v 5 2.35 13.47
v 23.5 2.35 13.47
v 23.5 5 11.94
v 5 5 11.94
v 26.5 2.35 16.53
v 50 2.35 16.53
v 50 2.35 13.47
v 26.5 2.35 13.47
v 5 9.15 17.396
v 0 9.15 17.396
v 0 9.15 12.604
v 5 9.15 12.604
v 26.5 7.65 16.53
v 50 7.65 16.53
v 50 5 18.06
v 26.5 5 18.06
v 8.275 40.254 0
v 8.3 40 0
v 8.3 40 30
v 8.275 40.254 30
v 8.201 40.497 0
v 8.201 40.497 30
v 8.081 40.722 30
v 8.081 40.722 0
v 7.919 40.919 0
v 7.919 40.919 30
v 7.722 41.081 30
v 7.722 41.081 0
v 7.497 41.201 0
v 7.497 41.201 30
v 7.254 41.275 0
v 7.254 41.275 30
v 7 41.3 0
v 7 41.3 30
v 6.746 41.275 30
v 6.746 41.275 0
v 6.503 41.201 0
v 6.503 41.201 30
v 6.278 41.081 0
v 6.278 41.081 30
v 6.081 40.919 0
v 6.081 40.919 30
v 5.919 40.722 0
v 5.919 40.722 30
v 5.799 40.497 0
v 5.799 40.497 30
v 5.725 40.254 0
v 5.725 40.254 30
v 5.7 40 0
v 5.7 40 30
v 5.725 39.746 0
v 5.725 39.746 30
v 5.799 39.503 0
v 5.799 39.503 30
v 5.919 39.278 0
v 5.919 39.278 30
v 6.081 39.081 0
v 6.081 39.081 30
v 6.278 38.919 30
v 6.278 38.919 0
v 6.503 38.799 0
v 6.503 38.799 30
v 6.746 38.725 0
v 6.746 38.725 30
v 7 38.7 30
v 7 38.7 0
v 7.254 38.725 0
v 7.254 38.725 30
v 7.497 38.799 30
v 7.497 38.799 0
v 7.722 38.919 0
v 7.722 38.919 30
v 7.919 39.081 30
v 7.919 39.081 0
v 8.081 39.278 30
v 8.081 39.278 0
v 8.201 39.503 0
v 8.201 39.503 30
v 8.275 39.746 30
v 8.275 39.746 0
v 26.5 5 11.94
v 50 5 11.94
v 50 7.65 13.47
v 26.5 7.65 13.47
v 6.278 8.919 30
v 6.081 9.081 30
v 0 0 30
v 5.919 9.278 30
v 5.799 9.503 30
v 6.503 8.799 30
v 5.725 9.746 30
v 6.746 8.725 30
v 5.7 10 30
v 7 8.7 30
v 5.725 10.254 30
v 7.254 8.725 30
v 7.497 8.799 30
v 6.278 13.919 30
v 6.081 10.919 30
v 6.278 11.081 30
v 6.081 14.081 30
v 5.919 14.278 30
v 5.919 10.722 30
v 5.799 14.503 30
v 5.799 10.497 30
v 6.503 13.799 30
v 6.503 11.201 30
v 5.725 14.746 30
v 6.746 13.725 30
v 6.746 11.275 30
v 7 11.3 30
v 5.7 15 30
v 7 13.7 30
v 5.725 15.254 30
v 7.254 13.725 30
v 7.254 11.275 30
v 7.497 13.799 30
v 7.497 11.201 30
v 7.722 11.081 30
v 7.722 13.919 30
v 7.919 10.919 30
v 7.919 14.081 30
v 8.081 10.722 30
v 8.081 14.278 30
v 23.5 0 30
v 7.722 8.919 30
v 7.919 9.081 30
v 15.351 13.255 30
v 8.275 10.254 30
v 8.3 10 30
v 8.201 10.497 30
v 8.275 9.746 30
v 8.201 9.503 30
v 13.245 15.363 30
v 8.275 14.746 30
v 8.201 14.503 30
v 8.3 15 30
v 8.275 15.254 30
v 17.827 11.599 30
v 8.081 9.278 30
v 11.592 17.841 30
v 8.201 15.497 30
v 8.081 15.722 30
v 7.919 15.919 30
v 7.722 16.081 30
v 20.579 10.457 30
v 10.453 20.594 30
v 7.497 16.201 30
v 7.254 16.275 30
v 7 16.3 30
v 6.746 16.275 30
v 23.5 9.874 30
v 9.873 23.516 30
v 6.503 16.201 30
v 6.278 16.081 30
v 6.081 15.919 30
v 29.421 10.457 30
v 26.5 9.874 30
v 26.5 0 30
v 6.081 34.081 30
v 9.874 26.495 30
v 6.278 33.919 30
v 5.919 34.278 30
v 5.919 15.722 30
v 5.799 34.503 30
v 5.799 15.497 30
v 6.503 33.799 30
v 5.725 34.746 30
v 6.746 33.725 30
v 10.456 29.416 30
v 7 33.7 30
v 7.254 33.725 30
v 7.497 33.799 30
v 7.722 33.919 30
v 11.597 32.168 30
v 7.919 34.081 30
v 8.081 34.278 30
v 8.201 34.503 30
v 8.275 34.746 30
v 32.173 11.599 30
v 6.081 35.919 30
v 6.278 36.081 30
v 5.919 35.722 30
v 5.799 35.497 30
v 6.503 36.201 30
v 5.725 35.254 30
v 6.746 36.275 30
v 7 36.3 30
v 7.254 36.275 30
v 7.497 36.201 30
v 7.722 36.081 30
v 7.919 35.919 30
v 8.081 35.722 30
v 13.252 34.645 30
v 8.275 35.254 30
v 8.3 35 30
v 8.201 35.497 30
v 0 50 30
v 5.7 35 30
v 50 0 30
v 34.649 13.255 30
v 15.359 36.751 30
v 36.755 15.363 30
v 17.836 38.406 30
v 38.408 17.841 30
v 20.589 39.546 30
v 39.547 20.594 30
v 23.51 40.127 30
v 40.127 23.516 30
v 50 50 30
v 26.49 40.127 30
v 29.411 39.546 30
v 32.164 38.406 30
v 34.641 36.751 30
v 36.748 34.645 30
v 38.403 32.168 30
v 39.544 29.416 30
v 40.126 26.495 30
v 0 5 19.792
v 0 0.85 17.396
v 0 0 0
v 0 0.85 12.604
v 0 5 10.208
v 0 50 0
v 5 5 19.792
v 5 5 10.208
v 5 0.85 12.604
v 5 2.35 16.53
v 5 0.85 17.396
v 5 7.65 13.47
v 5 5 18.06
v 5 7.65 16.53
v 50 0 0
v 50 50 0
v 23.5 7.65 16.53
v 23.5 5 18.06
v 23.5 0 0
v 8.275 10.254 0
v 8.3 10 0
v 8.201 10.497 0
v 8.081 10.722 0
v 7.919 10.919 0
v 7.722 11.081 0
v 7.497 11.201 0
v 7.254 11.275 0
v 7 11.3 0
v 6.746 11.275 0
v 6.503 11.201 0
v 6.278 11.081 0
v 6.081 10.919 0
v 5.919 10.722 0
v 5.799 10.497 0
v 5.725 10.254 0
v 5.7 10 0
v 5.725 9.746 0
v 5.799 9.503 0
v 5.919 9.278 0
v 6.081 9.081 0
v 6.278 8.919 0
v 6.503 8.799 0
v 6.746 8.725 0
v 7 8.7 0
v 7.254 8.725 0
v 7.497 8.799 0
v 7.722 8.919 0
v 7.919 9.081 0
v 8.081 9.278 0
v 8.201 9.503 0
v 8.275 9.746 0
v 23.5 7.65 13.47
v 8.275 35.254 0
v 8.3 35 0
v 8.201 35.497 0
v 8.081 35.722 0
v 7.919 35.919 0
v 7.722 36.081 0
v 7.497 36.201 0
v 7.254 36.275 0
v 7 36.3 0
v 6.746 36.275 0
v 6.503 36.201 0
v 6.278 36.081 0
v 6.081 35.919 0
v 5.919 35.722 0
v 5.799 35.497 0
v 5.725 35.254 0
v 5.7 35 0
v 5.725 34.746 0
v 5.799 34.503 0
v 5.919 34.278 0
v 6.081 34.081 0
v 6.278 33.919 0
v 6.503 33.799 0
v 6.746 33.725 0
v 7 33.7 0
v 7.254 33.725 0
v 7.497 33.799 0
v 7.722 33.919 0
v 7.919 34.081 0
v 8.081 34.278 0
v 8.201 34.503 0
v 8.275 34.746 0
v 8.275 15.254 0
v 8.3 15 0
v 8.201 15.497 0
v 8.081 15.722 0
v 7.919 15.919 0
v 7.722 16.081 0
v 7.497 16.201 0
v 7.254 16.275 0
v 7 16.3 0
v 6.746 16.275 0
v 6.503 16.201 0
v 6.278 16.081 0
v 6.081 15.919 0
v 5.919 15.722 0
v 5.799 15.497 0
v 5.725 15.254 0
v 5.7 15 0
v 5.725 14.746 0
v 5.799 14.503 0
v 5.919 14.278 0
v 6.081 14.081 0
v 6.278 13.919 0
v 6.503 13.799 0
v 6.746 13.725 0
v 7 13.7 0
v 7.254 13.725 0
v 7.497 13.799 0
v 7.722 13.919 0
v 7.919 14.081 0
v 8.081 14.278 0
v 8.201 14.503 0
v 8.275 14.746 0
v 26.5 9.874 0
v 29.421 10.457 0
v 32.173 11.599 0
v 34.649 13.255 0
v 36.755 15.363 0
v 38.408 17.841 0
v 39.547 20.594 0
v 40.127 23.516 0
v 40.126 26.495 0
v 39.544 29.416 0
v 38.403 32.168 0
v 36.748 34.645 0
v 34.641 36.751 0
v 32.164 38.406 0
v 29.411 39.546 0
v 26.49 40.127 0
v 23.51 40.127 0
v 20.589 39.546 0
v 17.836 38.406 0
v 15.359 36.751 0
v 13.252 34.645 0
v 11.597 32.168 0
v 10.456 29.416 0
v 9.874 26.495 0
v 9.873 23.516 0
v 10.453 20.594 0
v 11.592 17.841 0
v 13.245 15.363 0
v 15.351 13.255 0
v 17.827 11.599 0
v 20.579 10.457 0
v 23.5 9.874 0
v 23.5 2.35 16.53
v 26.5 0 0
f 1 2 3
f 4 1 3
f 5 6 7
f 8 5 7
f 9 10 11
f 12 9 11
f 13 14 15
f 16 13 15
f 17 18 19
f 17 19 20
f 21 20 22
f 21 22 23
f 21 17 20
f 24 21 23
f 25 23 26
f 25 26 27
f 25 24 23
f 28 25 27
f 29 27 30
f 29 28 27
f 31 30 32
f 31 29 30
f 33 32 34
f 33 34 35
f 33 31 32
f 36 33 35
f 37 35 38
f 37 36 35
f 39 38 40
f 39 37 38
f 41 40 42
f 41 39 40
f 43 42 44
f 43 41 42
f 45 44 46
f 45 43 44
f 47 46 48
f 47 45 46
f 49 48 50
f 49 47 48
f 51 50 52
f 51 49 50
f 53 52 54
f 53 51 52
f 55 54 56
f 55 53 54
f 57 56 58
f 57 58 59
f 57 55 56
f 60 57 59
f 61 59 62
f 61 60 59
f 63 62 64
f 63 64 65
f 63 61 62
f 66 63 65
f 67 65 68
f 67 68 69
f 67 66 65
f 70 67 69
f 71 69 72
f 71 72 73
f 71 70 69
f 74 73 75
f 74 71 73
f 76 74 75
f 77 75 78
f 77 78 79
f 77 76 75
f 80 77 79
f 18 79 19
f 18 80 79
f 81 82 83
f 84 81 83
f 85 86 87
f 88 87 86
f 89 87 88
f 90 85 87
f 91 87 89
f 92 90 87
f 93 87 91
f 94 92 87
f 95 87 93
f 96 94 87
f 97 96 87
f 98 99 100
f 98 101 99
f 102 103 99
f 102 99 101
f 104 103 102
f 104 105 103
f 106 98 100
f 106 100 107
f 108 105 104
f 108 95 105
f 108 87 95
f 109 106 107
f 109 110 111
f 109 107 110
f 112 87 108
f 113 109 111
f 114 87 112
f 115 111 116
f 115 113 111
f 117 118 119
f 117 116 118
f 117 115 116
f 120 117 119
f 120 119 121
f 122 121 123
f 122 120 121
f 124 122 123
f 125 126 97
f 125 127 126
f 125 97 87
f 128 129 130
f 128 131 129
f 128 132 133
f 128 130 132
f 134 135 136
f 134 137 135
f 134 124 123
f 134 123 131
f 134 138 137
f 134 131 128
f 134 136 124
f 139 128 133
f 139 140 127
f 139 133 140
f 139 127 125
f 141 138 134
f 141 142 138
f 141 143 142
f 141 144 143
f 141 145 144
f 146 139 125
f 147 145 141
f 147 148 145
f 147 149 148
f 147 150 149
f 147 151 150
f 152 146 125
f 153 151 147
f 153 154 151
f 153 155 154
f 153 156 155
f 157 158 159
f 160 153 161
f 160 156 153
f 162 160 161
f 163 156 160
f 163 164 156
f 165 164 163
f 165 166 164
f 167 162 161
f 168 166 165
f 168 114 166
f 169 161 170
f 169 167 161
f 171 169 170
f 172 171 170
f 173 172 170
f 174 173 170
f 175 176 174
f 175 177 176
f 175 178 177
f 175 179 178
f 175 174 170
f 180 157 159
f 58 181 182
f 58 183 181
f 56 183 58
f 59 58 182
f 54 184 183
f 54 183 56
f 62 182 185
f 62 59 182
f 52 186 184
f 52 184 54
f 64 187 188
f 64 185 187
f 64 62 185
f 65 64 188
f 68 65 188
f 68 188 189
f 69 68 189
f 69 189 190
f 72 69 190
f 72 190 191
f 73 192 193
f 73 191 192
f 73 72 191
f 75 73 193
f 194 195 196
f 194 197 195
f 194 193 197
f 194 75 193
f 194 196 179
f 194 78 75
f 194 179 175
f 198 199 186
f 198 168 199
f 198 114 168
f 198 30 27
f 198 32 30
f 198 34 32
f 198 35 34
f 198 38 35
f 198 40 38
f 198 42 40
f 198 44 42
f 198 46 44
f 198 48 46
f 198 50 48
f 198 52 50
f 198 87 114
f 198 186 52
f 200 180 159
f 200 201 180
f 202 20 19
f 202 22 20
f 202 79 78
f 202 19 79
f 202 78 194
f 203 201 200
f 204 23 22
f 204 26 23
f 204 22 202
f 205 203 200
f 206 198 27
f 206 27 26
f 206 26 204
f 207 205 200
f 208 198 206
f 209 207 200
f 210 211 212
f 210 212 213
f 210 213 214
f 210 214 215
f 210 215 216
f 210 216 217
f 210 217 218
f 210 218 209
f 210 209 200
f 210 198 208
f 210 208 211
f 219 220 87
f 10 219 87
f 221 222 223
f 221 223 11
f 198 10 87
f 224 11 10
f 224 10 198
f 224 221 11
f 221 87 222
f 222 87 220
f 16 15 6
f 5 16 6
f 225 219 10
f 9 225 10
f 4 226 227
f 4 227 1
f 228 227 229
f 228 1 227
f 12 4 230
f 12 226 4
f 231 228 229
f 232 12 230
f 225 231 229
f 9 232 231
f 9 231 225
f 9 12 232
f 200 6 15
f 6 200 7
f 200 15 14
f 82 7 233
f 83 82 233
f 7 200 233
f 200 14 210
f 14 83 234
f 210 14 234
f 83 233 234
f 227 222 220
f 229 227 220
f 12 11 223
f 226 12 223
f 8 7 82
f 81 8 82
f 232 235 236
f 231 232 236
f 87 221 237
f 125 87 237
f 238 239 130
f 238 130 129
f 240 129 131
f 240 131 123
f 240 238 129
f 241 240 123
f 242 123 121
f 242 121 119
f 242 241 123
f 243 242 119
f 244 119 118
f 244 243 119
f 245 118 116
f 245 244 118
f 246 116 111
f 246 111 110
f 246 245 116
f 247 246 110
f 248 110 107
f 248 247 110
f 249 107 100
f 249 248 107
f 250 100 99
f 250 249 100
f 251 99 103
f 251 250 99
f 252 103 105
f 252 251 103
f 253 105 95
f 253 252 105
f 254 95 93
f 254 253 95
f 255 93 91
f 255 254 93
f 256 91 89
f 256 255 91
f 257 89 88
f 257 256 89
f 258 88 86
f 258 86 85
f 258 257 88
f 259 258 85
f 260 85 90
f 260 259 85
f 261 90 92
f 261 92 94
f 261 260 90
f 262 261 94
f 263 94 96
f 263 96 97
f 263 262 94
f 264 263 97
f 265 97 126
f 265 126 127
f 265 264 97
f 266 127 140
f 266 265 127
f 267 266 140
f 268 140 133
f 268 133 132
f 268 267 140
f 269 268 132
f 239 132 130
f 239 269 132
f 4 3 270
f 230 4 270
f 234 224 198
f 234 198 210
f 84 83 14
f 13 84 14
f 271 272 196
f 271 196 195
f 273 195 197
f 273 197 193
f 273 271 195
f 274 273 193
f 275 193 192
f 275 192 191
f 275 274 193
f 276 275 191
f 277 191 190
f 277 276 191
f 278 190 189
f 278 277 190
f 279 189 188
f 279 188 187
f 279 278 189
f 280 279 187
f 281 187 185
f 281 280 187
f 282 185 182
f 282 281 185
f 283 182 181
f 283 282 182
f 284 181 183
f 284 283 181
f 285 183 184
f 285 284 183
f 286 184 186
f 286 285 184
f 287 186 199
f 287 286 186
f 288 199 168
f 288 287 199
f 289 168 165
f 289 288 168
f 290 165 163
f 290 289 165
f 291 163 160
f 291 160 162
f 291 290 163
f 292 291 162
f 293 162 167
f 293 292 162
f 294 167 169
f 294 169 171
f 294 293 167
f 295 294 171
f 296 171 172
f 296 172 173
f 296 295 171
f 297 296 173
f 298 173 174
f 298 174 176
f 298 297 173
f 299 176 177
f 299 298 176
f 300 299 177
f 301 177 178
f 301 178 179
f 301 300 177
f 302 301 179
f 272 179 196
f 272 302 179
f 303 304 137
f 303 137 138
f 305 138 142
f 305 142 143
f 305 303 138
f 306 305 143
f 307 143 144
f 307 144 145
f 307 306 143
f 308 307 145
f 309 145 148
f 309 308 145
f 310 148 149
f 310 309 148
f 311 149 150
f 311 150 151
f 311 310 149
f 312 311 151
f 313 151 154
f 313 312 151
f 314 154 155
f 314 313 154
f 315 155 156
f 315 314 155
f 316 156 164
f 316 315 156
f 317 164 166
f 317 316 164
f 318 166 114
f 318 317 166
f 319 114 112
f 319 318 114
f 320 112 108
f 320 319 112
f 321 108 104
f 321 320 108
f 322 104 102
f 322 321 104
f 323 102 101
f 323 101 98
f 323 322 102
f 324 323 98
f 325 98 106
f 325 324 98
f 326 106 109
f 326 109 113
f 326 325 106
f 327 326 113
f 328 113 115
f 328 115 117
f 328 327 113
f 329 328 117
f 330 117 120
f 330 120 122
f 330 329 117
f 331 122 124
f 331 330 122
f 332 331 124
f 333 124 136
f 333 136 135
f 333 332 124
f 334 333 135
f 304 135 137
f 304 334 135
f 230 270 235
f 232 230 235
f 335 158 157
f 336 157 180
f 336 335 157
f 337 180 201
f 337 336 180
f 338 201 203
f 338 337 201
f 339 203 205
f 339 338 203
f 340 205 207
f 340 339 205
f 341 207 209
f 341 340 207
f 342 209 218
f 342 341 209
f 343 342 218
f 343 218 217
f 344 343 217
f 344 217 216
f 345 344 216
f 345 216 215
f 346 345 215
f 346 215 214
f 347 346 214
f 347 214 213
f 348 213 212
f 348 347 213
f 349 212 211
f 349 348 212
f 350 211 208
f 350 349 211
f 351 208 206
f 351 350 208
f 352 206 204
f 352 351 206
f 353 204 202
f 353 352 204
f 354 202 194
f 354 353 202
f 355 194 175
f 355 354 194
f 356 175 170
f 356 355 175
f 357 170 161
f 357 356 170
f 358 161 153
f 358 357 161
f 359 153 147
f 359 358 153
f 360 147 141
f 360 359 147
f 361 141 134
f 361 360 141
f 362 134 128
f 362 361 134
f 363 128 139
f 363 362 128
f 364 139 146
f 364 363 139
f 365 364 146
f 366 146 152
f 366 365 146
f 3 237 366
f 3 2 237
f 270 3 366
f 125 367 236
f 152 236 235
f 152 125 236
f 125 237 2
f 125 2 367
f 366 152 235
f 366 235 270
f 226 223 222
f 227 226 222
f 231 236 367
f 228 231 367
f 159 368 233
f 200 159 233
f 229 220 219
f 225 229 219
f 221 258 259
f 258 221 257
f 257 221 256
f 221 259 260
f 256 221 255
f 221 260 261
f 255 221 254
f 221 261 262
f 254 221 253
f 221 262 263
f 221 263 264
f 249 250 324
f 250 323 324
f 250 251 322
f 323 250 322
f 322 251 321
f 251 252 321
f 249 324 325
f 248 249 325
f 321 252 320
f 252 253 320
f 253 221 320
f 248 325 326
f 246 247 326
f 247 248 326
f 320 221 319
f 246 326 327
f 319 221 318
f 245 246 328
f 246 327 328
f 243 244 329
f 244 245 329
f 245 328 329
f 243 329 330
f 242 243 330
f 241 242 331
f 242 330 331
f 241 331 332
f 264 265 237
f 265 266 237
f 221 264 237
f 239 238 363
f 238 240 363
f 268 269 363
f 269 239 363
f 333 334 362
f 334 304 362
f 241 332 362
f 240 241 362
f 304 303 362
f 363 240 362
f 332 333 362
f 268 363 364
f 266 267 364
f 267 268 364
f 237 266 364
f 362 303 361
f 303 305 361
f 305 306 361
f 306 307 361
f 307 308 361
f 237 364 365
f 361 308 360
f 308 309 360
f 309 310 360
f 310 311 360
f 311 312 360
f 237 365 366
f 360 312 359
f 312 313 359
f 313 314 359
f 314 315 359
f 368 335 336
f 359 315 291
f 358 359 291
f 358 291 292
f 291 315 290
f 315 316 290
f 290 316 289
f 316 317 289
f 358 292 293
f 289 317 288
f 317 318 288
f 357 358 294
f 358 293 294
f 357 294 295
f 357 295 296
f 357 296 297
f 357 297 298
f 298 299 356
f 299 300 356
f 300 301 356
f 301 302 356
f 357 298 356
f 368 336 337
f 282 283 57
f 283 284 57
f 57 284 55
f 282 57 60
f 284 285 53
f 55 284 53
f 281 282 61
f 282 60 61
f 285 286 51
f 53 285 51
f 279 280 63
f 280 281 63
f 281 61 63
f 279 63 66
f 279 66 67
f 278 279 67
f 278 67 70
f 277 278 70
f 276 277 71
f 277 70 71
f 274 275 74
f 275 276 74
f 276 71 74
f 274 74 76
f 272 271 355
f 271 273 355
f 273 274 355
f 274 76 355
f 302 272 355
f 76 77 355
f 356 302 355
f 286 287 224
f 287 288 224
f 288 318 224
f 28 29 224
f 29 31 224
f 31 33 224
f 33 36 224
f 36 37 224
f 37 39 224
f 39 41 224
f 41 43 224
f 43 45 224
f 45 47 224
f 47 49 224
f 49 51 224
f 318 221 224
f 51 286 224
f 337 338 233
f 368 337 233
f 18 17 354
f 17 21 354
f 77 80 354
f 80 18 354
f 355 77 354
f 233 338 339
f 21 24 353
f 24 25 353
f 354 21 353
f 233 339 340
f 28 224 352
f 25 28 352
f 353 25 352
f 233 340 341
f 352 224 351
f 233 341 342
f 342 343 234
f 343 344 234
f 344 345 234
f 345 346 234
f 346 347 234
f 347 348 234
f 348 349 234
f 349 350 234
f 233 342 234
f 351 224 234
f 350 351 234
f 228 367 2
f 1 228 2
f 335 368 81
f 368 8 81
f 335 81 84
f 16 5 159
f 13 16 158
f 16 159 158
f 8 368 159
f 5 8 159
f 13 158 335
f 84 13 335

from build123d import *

# Parameters (mm, degrees)
SKETCH1_W           = 50
SKETCH1_H           = 50
SKETCH1_R           = 15.2
SKETCH1_R_2         = 1.3
BOSS_EXTRUDE1_DEPTH = 30
CUT_EXTRUDE1_REACH  = 32
SKETCH2_W           = 3
SKETCH2_H           = 11.709133009
CUT_EXTRUDE2_DEPTH  = 54
CUT_EXTRUDE3_DEPTH  = 5


with BuildPart() as part:
    # Sketch1 → Boss-Extrude1 (new body)
    with BuildSketch(Plane.XY):
        with Locations((25, 25)):
            Rectangle(SKETCH1_W, SKETCH1_H)
        with Locations((25, 25)):
            Circle(SKETCH1_R, mode=Mode.SUBTRACT)
        with Locations((7, 15)):
            Circle(SKETCH1_R_2, mode=Mode.SUBTRACT)
        with Locations((7, 40)):
            Circle(SKETCH1_R_2, mode=Mode.SUBTRACT)
        with Locations((7, 10)):
            Circle(SKETCH1_R_2, mode=Mode.SUBTRACT)
        with Locations((7, 35)):
            Circle(SKETCH1_R_2, mode=Mode.SUBTRACT)
    extrude(amount=BOSS_EXTRUDE1_DEPTH)

    # Sketch2 → Cut-Extrude1 (cut, up to next)
    with BuildSketch(Plane.XY.offset(30), mode=Mode.PRIVATE) as cut_extrude1_sk1:
        with Locations((25, 5.854566505)):
            Rectangle(SKETCH2_W, SKETCH2_H)
    cut_extrude1_tool1 = extrude(cut_extrude1_sk1.sketch, amount=-CUT_EXTRUDE1_REACH, mode=Mode.PRIVATE) & part.part
    add(cut_extrude1_tool1.solids().sort_by_distance((25, 5.854567, 30))[0], mode=Mode.SUBTRACT)

    # Sketch3 → Cut-Extrude2 (cut)
    with BuildSketch(Plane(origin=(50, 0, 0), x_dir=(0, 0, -1), z_dir=(1, 0, 0))):
        Polygon((-11.940043573, 5), (-13.470021787, 7.65), (-16.529978213, 7.65), (-18.059956427, 5), (-16.529978213, 2.35), (-13.470021787, 2.35), align=None)
    extrude(amount=-CUT_EXTRUDE2_DEPTH, mode=Mode.SUBTRACT)

    # Sketch4 → Cut-Extrude3 (cut)
    with BuildSketch(Plane.ZY):
        Polygon((19.792007234, 5), (17.396003617, 9.15), (12.603996383, 9.15), (10.207992766, 5), (12.603996383, 0.85), (17.396003617, 0.85), align=None)
    extrude(amount=-CUT_EXTRUDE3_DEPTH, mode=Mode.SUBTRACT)


solid = part.part
